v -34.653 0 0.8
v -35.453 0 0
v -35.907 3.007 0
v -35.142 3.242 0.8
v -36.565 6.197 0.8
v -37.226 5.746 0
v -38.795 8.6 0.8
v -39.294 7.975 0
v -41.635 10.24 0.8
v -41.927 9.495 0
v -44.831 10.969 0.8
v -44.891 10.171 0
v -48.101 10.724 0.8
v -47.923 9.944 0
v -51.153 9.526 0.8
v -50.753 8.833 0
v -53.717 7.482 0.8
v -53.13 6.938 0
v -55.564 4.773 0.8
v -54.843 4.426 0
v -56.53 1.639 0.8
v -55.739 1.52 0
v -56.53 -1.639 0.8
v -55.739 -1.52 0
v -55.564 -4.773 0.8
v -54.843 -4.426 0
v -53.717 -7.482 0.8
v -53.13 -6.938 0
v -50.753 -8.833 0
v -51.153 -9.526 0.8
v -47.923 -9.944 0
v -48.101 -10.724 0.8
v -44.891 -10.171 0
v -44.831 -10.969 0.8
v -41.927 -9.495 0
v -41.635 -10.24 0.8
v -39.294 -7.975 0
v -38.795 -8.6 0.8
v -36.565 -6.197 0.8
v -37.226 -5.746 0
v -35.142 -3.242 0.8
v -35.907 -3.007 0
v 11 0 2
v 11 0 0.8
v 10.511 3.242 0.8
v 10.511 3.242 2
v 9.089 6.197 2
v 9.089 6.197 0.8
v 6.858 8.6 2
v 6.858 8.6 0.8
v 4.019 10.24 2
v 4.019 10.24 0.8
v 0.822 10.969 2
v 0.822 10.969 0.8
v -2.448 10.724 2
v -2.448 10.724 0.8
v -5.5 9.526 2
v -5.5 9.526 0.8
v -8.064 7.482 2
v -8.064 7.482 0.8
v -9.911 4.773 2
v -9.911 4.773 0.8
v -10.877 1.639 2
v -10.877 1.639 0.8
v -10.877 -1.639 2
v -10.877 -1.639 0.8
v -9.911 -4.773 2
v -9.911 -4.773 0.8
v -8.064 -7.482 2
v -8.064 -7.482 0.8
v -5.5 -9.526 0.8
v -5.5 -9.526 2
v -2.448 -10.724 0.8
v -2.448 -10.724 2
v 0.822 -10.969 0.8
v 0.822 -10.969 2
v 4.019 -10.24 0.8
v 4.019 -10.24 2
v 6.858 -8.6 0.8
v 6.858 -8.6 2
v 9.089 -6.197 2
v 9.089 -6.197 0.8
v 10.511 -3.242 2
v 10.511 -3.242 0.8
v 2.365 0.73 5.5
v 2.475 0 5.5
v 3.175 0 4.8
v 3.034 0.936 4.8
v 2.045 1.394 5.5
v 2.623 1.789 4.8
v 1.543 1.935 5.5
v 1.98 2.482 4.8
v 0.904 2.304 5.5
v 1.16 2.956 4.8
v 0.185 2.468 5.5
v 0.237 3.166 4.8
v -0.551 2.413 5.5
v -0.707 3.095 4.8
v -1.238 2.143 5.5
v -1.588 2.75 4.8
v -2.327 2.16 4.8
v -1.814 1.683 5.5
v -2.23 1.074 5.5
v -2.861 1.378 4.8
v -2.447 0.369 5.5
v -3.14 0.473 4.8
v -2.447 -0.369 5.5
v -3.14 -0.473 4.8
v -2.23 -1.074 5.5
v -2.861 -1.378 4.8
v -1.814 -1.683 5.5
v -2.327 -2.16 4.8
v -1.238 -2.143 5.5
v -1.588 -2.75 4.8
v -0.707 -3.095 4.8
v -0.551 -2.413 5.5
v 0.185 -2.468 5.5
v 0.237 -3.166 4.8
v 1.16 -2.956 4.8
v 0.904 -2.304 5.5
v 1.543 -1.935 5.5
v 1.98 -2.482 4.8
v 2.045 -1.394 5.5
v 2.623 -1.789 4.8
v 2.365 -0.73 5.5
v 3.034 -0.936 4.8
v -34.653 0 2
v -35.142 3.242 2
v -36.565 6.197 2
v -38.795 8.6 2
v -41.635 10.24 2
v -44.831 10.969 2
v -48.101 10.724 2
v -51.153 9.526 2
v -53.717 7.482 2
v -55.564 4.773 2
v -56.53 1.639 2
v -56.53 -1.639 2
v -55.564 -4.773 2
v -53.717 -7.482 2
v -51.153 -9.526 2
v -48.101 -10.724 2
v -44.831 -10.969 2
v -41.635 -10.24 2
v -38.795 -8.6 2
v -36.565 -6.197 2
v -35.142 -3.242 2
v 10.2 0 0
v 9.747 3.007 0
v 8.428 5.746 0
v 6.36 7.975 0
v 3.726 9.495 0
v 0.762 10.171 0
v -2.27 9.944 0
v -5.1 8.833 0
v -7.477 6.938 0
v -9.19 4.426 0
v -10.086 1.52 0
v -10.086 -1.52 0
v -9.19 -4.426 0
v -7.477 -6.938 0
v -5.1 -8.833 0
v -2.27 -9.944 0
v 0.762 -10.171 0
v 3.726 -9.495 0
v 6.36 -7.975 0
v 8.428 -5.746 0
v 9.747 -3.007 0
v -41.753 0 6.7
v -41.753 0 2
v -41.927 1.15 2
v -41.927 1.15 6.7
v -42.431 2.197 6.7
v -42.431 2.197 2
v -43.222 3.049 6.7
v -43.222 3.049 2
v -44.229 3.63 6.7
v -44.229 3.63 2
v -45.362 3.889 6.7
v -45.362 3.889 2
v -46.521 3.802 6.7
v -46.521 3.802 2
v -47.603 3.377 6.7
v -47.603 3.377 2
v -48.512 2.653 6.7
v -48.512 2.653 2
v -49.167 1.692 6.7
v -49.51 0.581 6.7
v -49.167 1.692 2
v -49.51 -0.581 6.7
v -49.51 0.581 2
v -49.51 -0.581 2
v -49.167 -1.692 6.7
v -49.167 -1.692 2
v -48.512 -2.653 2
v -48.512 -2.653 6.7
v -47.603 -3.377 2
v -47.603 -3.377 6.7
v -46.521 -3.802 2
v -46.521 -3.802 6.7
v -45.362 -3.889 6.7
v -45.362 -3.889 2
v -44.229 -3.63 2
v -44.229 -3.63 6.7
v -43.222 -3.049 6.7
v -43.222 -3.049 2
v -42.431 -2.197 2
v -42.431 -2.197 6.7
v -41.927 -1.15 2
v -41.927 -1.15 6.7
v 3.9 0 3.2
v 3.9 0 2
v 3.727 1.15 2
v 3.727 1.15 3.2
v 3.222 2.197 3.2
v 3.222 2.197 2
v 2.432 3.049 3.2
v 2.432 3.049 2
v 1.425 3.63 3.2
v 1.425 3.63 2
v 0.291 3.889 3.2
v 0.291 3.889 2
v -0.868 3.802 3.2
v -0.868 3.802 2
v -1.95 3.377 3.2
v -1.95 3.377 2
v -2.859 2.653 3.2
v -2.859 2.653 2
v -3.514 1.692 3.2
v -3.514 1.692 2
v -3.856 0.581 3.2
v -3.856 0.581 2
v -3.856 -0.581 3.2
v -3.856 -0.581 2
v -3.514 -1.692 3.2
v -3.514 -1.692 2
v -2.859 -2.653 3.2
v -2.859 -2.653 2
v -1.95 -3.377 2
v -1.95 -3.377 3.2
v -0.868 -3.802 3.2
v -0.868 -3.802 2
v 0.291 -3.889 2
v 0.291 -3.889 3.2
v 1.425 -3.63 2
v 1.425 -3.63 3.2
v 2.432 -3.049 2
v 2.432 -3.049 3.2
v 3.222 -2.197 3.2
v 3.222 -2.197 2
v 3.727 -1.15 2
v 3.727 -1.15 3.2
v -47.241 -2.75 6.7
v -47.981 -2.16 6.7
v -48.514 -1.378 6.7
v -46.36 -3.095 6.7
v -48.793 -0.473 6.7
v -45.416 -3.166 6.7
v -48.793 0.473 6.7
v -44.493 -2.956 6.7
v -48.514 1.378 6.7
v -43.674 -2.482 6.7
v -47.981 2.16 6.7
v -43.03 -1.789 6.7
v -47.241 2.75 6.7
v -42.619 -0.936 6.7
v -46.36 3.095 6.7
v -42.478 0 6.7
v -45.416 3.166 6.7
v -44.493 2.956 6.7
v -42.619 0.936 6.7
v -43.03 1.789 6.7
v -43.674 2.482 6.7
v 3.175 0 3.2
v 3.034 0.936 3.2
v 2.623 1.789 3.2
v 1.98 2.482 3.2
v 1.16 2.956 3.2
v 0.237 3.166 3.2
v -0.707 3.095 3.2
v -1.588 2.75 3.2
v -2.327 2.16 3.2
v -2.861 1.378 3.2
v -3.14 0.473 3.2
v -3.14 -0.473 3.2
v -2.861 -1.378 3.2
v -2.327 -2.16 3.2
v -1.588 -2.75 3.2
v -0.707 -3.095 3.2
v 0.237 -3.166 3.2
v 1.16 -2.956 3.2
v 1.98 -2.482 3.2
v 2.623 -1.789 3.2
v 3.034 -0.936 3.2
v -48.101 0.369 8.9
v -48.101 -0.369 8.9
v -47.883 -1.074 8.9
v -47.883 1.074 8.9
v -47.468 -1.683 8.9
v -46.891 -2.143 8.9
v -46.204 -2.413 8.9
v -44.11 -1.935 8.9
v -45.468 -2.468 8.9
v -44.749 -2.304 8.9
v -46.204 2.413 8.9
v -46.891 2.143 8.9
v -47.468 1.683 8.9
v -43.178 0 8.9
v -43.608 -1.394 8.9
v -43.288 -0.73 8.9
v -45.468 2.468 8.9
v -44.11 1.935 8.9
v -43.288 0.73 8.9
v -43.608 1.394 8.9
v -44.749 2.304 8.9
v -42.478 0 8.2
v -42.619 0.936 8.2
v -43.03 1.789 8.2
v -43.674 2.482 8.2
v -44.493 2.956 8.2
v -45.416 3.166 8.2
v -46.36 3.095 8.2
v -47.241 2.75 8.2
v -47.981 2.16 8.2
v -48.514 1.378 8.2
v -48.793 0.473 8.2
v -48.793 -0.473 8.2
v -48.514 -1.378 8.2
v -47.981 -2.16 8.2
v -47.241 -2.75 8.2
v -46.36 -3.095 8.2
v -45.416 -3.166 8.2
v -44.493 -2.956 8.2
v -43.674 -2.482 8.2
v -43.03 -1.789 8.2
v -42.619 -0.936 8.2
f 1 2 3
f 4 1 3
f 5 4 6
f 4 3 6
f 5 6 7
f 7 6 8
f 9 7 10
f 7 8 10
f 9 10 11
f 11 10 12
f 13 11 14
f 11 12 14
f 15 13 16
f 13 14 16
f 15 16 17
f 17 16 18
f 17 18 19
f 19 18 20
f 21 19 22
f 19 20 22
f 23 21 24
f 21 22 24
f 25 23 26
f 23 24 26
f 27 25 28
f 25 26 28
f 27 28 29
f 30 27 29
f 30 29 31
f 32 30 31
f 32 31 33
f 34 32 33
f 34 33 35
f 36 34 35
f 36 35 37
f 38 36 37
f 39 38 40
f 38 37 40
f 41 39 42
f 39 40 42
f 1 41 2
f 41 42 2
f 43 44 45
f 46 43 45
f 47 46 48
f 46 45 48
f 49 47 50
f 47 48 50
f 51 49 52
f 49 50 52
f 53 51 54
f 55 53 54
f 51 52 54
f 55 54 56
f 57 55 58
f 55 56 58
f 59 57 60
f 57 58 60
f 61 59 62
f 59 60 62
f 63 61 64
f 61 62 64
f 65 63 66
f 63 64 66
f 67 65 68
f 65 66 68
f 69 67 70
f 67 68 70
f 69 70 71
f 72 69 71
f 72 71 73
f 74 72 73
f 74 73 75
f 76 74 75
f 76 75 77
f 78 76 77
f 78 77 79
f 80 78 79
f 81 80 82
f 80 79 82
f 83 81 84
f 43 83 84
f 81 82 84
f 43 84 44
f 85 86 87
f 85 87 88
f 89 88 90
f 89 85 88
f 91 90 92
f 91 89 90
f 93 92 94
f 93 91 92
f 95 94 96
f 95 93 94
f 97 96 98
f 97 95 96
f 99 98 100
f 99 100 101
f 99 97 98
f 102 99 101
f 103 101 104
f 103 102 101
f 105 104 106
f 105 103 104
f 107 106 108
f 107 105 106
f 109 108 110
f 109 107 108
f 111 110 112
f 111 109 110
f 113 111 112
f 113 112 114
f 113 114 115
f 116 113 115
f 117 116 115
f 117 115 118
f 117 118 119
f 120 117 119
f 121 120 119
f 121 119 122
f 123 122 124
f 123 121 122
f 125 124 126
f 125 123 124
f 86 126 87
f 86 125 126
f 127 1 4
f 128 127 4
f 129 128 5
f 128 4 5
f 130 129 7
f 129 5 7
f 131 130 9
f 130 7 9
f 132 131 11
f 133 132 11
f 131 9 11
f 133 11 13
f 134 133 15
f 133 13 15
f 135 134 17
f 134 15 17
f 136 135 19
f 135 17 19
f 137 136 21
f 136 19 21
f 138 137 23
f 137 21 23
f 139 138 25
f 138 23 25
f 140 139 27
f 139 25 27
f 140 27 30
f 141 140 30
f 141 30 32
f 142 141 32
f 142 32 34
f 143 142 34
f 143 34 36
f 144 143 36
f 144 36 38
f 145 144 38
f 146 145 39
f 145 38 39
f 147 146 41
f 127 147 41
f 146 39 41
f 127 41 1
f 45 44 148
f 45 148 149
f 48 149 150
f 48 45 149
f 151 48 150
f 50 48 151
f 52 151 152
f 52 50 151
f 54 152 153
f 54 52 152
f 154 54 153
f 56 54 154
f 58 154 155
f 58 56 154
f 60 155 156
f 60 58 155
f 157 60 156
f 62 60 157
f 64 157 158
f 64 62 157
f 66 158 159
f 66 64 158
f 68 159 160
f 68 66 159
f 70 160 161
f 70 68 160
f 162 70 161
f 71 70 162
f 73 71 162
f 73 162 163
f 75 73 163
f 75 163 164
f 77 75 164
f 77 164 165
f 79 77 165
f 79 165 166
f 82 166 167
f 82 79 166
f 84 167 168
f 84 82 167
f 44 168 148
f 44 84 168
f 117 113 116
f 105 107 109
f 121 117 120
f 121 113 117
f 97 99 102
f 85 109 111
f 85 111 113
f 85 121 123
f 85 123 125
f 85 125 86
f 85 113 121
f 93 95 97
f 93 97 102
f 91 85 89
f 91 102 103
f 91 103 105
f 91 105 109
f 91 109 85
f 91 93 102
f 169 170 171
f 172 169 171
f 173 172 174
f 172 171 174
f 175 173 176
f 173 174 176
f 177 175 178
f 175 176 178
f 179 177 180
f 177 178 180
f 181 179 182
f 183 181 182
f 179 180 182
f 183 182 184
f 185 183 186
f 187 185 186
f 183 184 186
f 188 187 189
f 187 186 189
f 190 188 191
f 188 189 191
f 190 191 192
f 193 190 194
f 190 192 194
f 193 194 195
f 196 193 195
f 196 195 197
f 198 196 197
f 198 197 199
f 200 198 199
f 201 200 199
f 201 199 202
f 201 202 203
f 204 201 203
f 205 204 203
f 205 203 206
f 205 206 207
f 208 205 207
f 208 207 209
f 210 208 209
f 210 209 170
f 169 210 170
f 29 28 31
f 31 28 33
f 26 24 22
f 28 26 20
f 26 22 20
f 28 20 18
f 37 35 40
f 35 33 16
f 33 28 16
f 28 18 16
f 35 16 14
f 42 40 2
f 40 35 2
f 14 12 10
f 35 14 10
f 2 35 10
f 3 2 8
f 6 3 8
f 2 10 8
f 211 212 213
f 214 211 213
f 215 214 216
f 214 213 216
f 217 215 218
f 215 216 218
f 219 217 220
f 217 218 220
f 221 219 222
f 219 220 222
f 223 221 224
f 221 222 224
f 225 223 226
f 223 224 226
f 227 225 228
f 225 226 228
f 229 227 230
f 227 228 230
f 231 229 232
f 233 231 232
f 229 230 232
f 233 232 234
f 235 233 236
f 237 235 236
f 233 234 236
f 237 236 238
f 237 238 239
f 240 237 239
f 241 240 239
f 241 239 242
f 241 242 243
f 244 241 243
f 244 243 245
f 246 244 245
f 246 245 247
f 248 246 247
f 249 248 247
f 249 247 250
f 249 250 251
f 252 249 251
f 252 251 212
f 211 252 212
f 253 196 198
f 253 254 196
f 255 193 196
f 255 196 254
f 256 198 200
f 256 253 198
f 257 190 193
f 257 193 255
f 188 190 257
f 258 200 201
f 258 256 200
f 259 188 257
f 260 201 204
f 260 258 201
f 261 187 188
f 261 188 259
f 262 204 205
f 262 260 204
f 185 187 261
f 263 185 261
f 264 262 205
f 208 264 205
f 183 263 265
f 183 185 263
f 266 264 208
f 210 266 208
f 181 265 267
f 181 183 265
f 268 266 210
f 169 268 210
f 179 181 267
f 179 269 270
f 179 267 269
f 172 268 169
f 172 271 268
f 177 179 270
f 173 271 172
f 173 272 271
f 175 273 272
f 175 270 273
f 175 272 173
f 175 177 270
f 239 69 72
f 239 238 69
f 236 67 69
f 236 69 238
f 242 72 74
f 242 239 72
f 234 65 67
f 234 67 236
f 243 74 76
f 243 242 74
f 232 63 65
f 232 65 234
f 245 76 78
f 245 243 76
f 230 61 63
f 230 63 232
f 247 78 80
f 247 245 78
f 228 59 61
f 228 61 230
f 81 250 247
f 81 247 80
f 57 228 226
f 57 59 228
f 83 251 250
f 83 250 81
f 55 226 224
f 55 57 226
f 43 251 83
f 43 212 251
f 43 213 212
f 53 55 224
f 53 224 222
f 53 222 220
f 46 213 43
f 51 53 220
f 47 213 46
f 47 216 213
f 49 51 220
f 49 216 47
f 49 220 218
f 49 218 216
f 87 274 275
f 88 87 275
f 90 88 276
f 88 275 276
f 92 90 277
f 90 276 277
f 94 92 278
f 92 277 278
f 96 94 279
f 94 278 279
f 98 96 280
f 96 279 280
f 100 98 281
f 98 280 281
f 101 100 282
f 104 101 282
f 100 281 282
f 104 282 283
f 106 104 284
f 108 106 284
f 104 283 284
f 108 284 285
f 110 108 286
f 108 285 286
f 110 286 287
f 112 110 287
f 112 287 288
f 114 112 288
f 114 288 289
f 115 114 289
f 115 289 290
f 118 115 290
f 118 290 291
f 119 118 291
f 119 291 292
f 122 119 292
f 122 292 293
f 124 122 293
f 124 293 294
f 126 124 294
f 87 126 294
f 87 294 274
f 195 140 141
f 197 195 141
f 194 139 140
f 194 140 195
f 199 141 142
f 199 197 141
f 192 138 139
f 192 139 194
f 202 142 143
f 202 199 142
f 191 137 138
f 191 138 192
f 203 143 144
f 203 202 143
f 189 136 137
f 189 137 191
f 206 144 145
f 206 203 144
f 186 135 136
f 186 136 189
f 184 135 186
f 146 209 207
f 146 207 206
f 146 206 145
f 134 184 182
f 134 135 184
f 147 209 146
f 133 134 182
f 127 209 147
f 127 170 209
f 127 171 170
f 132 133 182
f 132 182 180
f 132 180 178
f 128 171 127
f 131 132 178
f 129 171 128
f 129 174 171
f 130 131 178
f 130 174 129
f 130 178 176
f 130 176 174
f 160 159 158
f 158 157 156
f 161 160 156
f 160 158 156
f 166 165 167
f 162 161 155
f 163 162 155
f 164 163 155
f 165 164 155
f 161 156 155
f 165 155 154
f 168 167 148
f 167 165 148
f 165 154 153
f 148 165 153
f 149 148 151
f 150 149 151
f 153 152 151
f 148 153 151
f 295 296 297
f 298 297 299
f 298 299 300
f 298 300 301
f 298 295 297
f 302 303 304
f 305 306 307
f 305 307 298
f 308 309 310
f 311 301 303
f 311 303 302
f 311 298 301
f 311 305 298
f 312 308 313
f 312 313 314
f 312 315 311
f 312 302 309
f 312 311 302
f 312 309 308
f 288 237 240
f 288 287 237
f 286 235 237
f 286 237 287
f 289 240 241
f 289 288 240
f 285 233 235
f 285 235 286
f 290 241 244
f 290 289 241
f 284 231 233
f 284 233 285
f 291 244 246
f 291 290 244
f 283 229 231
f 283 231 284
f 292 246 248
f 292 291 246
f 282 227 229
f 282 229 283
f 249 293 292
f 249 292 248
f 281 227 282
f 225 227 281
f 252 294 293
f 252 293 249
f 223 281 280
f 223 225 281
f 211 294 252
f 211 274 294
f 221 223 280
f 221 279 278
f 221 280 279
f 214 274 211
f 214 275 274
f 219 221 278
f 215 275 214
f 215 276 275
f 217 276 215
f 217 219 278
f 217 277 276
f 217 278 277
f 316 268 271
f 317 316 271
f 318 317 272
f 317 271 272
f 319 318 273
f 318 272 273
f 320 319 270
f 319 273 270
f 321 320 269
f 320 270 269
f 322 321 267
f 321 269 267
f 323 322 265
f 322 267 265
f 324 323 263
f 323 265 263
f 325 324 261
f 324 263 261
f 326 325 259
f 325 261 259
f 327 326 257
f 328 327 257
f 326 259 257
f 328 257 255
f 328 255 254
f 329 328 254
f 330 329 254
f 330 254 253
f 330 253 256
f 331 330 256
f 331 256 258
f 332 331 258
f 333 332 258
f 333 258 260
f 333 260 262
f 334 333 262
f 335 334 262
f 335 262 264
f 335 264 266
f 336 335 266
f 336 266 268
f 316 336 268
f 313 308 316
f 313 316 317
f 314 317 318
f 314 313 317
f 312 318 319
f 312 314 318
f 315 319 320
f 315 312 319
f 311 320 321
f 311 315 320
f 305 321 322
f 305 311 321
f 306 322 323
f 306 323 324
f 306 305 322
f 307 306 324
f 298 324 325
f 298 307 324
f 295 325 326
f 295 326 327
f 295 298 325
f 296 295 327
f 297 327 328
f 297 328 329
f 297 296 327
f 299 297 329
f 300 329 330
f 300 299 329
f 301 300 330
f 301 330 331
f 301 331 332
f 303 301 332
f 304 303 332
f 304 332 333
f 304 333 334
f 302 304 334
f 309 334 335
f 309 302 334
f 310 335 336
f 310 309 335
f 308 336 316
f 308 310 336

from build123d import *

# Parameters (mm, degrees)
F0_R     = 11
F0_R_2   = 3.9
F0_R_3   = 3.175
F1_DEPTH = 2
F2_DEPTH = 6.7
F3_DEPTH = 8.9
F4_DEPTH = 3.2
F5_DEPTH = 5.5
F6_SIZE  = 0.8
F7_SIZE  = 0.7


with BuildPart() as f1:
    # F0 (on Top) → F1 (new body)
    with BuildSketch(Plane.XY):
        with Locations((-45.653354, 0)):
            Circle(F0_R)
        with Locations((-45.653354, 0)):
            Circle(F0_R_2, mode=Mode.SUBTRACT)
        with Locations((-45.653354, 0)):
            Circle(F0_R_3)
        with Locations((-45.653354, 0)):
            Circle(F0_R_2)
        with Locations((-45.653354, 0)):
            Circle(F0_R_3, mode=Mode.SUBTRACT)
        Circle(F0_R)
        Circle(F0_R_2, mode=Mode.SUBTRACT)
        Circle(F0_R_2)
        Circle(F0_R_3, mode=Mode.SUBTRACT)
        Circle(F0_R_3)
    extrude(amount=F1_DEPTH)

    # F0 (on Top) → F2 (join)
    with BuildSketch(Plane.XY):
        with Locations((-45.653354, 0)):
            Circle(F0_R_3)
        with Locations((-45.653354, 0)):
            Circle(F0_R_2)
        with Locations((-45.653354, 0)):
            Circle(F0_R_3, mode=Mode.SUBTRACT)
    extrude(amount=F2_DEPTH)

    # F0 (on Top) → F3 (join)
    with BuildSketch(Plane.XY):
        with Locations((-45.653354, 0)):
            Circle(F0_R_3)
    extrude(amount=F3_DEPTH)

    # F0 (on Top) → F4 (join)
    with BuildSketch(Plane.XY):
        Circle(F0_R_3)
        Circle(F0_R_2)
        Circle(F0_R_3, mode=Mode.SUBTRACT)
    extrude(amount=F4_DEPTH)

    # F0 (on Top) → F5 (join)
    with BuildSketch(Plane.XY):
        Circle(F0_R_3)
    extrude(amount=F5_DEPTH)

    # F6
    f6_edges = [f1.edges().sort_by_distance(p)[0] for p in [
        (-56.653354, 0, 0),
        (-11, 0, 0),
    ]]
    chamfer(f6_edges, length=F6_SIZE)

    # F7
    f7_edges = [f1.edges().sort_by_distance(p)[0] for p in [
        (-48.828354, 0, 8.9),
        (-3.175, 0, 5.5),
    ]]
    chamfer(f7_edges, length=F7_SIZE)


solid = f1.part
